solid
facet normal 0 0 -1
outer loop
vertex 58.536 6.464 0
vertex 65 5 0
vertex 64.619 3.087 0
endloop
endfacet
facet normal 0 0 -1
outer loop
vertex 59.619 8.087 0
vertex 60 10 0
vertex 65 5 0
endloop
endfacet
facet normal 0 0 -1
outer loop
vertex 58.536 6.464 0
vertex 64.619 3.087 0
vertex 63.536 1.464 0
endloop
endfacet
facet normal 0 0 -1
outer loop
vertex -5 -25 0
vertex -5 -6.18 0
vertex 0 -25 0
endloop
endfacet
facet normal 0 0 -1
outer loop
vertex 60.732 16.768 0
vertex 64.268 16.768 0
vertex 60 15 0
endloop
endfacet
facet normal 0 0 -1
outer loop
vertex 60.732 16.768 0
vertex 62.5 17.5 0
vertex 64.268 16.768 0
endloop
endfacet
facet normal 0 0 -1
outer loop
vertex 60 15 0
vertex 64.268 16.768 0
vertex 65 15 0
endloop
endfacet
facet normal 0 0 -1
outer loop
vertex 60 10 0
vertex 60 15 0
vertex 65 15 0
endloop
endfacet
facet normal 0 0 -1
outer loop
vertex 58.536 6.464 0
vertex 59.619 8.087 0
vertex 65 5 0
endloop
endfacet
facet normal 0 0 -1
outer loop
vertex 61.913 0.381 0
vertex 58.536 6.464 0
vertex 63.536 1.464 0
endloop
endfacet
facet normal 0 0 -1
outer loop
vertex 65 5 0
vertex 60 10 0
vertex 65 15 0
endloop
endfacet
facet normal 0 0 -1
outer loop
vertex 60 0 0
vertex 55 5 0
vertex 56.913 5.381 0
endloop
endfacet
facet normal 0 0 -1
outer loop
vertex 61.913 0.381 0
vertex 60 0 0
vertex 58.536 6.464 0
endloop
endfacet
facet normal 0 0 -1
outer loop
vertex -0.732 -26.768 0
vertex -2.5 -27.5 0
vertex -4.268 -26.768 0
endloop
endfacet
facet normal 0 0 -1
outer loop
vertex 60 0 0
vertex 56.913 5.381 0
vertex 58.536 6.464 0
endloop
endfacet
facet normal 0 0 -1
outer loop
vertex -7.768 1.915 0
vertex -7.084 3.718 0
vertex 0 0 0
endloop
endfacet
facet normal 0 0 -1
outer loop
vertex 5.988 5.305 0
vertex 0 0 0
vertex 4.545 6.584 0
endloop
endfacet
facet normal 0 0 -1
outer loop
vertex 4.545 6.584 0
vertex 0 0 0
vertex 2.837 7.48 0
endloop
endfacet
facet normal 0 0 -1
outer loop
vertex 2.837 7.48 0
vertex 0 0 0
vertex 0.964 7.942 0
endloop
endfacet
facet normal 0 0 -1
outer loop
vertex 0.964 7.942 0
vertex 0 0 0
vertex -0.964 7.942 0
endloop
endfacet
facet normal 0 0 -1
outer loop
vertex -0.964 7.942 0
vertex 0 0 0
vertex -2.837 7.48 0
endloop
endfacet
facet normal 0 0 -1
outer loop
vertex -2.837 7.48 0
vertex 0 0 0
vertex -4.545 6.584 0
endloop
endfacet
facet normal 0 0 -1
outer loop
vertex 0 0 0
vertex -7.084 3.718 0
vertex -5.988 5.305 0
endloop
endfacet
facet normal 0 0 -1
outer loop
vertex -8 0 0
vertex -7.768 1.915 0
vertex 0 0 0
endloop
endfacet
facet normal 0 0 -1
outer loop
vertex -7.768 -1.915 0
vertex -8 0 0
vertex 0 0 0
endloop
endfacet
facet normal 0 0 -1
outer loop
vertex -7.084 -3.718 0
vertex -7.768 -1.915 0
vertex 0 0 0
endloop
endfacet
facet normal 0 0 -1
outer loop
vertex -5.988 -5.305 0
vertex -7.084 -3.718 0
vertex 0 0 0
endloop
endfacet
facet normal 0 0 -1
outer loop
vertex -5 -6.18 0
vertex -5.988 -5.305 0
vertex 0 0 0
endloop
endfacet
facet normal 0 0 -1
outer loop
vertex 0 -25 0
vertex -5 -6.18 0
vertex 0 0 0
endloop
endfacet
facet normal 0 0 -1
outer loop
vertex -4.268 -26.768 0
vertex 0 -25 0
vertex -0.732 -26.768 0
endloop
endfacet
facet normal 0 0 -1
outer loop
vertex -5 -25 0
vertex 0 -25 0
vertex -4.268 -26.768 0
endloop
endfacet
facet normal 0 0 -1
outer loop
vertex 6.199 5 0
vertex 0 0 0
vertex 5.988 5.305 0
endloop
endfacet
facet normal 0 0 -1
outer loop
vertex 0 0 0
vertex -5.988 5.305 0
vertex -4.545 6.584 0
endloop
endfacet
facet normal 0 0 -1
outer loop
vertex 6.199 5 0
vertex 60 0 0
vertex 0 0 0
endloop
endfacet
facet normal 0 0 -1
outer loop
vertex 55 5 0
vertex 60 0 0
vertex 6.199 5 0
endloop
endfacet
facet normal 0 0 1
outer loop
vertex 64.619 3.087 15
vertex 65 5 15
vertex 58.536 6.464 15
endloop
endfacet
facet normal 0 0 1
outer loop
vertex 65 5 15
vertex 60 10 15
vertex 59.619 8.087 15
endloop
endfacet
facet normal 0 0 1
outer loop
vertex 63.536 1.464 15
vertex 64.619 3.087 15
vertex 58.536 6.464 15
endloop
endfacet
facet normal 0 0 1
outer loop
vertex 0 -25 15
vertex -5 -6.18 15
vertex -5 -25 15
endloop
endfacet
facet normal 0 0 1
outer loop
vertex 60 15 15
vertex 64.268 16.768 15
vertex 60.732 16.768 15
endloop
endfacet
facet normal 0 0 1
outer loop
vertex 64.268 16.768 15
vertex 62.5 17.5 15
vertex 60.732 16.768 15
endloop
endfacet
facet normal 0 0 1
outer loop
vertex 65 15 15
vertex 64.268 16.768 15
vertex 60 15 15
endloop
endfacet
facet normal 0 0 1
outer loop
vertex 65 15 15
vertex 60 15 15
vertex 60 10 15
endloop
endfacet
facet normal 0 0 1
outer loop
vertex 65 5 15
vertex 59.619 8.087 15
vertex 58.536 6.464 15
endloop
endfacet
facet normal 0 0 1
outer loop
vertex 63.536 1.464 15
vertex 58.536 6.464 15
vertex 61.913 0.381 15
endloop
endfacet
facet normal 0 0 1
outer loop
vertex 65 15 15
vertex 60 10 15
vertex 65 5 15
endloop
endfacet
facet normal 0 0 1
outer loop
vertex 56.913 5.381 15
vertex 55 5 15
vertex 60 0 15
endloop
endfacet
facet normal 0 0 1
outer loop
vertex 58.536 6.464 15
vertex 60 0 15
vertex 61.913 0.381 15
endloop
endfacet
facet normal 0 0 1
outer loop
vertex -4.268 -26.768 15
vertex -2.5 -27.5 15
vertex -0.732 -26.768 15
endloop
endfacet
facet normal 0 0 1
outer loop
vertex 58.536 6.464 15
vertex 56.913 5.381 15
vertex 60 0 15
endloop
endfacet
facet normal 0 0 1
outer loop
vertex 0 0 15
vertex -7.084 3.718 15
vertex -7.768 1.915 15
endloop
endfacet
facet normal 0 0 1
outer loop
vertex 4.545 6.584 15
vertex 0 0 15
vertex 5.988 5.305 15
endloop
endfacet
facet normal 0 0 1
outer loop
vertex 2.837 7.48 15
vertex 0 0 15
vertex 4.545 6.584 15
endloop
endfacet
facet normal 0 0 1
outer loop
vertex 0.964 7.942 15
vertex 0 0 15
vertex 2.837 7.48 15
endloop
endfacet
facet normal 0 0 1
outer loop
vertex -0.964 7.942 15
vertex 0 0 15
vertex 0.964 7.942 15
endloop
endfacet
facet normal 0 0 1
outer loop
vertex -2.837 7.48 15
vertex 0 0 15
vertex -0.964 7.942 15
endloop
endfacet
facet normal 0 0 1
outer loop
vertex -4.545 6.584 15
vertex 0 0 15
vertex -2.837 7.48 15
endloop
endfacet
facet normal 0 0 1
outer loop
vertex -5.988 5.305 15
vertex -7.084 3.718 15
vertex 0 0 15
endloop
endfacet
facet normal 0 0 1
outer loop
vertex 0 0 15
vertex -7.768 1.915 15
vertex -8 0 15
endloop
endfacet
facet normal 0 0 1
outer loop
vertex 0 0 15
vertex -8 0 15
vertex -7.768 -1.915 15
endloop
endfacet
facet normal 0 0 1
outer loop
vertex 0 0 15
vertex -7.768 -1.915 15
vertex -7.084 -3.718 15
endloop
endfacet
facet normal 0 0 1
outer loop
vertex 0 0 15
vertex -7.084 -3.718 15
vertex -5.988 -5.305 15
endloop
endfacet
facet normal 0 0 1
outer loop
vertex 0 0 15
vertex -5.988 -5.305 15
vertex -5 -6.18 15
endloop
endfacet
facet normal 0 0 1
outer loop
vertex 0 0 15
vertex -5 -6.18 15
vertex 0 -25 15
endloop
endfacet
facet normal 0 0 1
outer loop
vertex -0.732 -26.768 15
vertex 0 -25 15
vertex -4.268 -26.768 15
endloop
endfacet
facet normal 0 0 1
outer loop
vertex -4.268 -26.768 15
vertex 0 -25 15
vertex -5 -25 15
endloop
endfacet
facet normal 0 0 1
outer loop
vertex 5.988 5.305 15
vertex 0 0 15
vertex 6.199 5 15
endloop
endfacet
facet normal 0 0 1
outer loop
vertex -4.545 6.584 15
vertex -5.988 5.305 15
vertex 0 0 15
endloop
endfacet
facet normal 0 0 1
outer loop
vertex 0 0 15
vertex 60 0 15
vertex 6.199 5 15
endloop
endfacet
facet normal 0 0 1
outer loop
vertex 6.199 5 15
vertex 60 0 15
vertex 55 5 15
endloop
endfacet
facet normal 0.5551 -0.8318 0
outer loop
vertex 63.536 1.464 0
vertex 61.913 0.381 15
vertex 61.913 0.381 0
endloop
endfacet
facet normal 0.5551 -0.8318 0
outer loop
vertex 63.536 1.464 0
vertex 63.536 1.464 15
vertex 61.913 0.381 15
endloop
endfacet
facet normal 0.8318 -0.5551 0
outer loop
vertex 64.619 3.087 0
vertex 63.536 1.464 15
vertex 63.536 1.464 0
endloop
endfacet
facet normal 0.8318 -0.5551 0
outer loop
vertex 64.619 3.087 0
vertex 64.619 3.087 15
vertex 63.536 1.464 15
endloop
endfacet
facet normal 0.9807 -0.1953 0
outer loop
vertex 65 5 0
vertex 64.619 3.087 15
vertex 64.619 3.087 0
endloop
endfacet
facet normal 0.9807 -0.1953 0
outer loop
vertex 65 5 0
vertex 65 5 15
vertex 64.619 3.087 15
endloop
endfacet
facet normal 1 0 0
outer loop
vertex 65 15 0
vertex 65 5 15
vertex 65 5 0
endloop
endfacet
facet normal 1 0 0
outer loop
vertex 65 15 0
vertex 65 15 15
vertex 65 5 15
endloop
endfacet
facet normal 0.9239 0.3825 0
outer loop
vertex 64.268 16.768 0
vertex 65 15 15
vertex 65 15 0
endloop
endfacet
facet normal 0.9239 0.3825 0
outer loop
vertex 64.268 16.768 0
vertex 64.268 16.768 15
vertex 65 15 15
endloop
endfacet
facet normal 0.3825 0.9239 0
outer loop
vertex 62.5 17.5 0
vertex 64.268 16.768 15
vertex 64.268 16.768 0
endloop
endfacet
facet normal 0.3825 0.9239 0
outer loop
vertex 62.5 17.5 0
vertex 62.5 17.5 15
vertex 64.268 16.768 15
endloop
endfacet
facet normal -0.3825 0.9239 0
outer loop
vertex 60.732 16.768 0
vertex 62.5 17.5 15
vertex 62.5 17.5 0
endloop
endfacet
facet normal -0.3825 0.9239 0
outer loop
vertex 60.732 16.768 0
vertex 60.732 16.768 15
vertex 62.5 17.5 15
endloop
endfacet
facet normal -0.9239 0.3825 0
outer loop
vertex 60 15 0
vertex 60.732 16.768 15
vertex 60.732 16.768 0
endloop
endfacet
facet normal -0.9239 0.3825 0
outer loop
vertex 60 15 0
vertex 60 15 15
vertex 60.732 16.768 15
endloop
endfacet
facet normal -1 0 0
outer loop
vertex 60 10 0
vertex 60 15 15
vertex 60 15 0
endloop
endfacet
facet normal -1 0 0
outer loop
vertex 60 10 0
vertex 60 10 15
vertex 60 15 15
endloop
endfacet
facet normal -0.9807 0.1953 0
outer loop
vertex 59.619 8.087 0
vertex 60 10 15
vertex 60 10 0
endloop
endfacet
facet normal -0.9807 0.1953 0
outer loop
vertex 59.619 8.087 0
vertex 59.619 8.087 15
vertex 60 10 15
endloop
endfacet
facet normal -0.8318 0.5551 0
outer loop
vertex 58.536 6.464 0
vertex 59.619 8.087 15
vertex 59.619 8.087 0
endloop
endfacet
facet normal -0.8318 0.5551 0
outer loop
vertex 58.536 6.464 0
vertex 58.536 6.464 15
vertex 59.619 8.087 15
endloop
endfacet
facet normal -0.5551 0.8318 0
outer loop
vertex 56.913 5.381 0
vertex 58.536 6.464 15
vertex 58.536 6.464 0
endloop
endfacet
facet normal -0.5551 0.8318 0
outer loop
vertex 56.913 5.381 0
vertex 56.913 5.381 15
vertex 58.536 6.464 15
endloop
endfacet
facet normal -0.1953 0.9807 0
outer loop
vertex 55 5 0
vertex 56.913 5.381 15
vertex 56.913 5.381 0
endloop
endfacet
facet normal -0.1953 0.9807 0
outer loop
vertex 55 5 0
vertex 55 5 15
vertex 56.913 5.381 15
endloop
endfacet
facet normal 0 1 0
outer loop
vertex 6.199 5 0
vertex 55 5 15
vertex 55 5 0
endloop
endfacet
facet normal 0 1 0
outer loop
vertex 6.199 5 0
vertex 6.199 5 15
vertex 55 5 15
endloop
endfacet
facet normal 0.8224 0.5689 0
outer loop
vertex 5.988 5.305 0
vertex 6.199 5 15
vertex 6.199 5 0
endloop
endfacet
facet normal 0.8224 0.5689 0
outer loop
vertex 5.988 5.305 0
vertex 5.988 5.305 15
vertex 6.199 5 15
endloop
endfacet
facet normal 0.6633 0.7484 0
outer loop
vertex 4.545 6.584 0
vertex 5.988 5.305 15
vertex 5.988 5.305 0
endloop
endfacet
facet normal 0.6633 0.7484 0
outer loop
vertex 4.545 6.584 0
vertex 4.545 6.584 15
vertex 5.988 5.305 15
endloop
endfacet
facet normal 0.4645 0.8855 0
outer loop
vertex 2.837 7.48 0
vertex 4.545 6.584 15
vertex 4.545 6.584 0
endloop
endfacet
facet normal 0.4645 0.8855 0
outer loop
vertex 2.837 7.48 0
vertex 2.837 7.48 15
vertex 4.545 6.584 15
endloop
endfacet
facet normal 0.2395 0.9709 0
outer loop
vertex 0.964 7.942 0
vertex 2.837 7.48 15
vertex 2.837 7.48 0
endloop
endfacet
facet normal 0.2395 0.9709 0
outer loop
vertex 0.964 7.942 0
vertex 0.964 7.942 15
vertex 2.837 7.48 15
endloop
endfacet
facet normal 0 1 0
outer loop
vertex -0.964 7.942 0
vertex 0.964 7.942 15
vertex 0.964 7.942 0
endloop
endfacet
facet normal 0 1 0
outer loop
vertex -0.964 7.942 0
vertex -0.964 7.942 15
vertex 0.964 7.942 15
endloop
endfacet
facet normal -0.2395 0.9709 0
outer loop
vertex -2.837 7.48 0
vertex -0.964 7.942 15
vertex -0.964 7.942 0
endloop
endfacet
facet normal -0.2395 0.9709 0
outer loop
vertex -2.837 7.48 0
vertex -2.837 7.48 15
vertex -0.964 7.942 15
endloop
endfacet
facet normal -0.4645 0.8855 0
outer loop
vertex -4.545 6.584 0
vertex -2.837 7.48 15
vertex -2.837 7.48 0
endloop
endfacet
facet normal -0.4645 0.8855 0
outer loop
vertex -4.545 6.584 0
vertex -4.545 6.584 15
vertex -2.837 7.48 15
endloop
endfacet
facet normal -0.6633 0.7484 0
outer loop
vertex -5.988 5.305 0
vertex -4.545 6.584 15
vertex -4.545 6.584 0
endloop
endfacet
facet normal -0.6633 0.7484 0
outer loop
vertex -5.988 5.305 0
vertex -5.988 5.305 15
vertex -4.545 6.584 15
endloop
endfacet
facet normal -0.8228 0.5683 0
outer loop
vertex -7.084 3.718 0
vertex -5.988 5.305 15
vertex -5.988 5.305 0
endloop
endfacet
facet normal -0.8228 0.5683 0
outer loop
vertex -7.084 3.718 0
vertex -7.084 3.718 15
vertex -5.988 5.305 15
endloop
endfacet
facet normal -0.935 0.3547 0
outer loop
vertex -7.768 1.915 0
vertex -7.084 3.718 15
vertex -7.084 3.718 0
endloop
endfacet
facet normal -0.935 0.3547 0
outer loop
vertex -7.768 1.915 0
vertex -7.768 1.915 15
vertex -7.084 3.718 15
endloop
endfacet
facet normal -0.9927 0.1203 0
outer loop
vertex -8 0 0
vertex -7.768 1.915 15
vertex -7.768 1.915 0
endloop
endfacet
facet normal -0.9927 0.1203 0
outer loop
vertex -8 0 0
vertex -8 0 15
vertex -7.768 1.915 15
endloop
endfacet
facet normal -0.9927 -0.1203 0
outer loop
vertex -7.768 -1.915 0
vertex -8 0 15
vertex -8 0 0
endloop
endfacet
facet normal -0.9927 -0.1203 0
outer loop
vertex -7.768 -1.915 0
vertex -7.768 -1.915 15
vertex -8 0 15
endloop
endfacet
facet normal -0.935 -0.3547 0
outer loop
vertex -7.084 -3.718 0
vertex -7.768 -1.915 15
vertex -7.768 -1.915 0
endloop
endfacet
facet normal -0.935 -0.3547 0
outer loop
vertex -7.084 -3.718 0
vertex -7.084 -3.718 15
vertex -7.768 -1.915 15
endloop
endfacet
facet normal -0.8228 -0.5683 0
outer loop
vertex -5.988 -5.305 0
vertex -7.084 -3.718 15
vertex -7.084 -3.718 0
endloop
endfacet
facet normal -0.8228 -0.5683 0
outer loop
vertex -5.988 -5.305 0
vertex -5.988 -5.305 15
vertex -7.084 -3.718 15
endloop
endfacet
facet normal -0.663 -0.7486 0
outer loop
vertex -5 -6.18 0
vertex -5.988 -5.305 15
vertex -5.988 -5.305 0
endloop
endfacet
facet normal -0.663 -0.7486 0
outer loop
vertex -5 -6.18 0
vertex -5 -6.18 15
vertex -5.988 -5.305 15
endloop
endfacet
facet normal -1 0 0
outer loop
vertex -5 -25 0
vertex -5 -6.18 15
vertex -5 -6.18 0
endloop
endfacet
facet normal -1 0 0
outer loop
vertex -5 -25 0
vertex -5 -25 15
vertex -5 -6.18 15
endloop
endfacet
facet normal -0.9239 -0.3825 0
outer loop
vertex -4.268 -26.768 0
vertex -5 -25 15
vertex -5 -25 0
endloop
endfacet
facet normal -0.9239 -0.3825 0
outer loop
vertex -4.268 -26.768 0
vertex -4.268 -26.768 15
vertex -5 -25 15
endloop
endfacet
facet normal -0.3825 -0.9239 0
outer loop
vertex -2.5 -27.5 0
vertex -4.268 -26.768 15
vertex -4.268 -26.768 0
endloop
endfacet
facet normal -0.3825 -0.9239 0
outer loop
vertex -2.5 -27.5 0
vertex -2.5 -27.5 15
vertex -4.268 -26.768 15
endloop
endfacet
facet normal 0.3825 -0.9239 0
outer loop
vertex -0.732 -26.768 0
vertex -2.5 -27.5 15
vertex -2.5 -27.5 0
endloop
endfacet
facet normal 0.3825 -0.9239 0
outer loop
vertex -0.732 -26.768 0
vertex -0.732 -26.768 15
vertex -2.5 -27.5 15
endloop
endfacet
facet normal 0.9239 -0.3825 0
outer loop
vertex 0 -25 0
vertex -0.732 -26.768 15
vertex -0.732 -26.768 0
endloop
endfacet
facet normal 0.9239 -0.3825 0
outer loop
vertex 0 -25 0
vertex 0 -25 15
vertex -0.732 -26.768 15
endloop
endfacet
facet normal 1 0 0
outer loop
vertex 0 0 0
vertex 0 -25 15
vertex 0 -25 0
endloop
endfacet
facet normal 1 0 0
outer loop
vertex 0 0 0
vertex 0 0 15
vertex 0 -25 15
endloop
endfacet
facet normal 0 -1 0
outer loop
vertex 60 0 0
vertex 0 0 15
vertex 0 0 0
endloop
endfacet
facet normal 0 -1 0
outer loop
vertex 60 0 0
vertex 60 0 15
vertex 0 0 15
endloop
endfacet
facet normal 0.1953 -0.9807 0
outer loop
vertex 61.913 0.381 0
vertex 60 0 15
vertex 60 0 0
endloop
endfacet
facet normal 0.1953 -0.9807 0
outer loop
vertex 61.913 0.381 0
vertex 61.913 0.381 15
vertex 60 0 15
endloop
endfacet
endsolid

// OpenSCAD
thickness=5;
length=60;
height=10;
depth=30;
circ=8;
extr=15;


//color("red")
linear_extrude(height = extr) {
    union() {
        square([length,thickness], center =false);
        translate([-thickness,-depth+thickness,0]){
            square([thickness, depth], center =false);
        }
    }

    intersection() {
        translate([length,thickness,0]){
            circle(r=thickness);
        }
        color("blue")
        translate([length,0,0]){
        square([thickness,thickness],center = false);
        }
    }
    
    difference() {
        translate([length-thickness,thickness,0]){
            color("red")
            square([thickness,thickness],center = false);
        }
        translate([length-thickness,thickness*2,0]){
            circle(r=thickness);
        }
    }
    
        translate([length,thickness,0]){
            square([thickness,height],center = false);
        }
        translate([length+thickness/2,thickness+height,0]){
            circle(r=thickness/2);
        }
        translate([-thickness/2,-depth+thickness,0]){
            circle(r=thickness/2);
        }
        
        
        
        difference() {
       
            circle(r=circ);
 
            color("blue")
            translate([0,-circ,0]){
                square([circ,circ],center = false);
            }
        }
        
    
}
